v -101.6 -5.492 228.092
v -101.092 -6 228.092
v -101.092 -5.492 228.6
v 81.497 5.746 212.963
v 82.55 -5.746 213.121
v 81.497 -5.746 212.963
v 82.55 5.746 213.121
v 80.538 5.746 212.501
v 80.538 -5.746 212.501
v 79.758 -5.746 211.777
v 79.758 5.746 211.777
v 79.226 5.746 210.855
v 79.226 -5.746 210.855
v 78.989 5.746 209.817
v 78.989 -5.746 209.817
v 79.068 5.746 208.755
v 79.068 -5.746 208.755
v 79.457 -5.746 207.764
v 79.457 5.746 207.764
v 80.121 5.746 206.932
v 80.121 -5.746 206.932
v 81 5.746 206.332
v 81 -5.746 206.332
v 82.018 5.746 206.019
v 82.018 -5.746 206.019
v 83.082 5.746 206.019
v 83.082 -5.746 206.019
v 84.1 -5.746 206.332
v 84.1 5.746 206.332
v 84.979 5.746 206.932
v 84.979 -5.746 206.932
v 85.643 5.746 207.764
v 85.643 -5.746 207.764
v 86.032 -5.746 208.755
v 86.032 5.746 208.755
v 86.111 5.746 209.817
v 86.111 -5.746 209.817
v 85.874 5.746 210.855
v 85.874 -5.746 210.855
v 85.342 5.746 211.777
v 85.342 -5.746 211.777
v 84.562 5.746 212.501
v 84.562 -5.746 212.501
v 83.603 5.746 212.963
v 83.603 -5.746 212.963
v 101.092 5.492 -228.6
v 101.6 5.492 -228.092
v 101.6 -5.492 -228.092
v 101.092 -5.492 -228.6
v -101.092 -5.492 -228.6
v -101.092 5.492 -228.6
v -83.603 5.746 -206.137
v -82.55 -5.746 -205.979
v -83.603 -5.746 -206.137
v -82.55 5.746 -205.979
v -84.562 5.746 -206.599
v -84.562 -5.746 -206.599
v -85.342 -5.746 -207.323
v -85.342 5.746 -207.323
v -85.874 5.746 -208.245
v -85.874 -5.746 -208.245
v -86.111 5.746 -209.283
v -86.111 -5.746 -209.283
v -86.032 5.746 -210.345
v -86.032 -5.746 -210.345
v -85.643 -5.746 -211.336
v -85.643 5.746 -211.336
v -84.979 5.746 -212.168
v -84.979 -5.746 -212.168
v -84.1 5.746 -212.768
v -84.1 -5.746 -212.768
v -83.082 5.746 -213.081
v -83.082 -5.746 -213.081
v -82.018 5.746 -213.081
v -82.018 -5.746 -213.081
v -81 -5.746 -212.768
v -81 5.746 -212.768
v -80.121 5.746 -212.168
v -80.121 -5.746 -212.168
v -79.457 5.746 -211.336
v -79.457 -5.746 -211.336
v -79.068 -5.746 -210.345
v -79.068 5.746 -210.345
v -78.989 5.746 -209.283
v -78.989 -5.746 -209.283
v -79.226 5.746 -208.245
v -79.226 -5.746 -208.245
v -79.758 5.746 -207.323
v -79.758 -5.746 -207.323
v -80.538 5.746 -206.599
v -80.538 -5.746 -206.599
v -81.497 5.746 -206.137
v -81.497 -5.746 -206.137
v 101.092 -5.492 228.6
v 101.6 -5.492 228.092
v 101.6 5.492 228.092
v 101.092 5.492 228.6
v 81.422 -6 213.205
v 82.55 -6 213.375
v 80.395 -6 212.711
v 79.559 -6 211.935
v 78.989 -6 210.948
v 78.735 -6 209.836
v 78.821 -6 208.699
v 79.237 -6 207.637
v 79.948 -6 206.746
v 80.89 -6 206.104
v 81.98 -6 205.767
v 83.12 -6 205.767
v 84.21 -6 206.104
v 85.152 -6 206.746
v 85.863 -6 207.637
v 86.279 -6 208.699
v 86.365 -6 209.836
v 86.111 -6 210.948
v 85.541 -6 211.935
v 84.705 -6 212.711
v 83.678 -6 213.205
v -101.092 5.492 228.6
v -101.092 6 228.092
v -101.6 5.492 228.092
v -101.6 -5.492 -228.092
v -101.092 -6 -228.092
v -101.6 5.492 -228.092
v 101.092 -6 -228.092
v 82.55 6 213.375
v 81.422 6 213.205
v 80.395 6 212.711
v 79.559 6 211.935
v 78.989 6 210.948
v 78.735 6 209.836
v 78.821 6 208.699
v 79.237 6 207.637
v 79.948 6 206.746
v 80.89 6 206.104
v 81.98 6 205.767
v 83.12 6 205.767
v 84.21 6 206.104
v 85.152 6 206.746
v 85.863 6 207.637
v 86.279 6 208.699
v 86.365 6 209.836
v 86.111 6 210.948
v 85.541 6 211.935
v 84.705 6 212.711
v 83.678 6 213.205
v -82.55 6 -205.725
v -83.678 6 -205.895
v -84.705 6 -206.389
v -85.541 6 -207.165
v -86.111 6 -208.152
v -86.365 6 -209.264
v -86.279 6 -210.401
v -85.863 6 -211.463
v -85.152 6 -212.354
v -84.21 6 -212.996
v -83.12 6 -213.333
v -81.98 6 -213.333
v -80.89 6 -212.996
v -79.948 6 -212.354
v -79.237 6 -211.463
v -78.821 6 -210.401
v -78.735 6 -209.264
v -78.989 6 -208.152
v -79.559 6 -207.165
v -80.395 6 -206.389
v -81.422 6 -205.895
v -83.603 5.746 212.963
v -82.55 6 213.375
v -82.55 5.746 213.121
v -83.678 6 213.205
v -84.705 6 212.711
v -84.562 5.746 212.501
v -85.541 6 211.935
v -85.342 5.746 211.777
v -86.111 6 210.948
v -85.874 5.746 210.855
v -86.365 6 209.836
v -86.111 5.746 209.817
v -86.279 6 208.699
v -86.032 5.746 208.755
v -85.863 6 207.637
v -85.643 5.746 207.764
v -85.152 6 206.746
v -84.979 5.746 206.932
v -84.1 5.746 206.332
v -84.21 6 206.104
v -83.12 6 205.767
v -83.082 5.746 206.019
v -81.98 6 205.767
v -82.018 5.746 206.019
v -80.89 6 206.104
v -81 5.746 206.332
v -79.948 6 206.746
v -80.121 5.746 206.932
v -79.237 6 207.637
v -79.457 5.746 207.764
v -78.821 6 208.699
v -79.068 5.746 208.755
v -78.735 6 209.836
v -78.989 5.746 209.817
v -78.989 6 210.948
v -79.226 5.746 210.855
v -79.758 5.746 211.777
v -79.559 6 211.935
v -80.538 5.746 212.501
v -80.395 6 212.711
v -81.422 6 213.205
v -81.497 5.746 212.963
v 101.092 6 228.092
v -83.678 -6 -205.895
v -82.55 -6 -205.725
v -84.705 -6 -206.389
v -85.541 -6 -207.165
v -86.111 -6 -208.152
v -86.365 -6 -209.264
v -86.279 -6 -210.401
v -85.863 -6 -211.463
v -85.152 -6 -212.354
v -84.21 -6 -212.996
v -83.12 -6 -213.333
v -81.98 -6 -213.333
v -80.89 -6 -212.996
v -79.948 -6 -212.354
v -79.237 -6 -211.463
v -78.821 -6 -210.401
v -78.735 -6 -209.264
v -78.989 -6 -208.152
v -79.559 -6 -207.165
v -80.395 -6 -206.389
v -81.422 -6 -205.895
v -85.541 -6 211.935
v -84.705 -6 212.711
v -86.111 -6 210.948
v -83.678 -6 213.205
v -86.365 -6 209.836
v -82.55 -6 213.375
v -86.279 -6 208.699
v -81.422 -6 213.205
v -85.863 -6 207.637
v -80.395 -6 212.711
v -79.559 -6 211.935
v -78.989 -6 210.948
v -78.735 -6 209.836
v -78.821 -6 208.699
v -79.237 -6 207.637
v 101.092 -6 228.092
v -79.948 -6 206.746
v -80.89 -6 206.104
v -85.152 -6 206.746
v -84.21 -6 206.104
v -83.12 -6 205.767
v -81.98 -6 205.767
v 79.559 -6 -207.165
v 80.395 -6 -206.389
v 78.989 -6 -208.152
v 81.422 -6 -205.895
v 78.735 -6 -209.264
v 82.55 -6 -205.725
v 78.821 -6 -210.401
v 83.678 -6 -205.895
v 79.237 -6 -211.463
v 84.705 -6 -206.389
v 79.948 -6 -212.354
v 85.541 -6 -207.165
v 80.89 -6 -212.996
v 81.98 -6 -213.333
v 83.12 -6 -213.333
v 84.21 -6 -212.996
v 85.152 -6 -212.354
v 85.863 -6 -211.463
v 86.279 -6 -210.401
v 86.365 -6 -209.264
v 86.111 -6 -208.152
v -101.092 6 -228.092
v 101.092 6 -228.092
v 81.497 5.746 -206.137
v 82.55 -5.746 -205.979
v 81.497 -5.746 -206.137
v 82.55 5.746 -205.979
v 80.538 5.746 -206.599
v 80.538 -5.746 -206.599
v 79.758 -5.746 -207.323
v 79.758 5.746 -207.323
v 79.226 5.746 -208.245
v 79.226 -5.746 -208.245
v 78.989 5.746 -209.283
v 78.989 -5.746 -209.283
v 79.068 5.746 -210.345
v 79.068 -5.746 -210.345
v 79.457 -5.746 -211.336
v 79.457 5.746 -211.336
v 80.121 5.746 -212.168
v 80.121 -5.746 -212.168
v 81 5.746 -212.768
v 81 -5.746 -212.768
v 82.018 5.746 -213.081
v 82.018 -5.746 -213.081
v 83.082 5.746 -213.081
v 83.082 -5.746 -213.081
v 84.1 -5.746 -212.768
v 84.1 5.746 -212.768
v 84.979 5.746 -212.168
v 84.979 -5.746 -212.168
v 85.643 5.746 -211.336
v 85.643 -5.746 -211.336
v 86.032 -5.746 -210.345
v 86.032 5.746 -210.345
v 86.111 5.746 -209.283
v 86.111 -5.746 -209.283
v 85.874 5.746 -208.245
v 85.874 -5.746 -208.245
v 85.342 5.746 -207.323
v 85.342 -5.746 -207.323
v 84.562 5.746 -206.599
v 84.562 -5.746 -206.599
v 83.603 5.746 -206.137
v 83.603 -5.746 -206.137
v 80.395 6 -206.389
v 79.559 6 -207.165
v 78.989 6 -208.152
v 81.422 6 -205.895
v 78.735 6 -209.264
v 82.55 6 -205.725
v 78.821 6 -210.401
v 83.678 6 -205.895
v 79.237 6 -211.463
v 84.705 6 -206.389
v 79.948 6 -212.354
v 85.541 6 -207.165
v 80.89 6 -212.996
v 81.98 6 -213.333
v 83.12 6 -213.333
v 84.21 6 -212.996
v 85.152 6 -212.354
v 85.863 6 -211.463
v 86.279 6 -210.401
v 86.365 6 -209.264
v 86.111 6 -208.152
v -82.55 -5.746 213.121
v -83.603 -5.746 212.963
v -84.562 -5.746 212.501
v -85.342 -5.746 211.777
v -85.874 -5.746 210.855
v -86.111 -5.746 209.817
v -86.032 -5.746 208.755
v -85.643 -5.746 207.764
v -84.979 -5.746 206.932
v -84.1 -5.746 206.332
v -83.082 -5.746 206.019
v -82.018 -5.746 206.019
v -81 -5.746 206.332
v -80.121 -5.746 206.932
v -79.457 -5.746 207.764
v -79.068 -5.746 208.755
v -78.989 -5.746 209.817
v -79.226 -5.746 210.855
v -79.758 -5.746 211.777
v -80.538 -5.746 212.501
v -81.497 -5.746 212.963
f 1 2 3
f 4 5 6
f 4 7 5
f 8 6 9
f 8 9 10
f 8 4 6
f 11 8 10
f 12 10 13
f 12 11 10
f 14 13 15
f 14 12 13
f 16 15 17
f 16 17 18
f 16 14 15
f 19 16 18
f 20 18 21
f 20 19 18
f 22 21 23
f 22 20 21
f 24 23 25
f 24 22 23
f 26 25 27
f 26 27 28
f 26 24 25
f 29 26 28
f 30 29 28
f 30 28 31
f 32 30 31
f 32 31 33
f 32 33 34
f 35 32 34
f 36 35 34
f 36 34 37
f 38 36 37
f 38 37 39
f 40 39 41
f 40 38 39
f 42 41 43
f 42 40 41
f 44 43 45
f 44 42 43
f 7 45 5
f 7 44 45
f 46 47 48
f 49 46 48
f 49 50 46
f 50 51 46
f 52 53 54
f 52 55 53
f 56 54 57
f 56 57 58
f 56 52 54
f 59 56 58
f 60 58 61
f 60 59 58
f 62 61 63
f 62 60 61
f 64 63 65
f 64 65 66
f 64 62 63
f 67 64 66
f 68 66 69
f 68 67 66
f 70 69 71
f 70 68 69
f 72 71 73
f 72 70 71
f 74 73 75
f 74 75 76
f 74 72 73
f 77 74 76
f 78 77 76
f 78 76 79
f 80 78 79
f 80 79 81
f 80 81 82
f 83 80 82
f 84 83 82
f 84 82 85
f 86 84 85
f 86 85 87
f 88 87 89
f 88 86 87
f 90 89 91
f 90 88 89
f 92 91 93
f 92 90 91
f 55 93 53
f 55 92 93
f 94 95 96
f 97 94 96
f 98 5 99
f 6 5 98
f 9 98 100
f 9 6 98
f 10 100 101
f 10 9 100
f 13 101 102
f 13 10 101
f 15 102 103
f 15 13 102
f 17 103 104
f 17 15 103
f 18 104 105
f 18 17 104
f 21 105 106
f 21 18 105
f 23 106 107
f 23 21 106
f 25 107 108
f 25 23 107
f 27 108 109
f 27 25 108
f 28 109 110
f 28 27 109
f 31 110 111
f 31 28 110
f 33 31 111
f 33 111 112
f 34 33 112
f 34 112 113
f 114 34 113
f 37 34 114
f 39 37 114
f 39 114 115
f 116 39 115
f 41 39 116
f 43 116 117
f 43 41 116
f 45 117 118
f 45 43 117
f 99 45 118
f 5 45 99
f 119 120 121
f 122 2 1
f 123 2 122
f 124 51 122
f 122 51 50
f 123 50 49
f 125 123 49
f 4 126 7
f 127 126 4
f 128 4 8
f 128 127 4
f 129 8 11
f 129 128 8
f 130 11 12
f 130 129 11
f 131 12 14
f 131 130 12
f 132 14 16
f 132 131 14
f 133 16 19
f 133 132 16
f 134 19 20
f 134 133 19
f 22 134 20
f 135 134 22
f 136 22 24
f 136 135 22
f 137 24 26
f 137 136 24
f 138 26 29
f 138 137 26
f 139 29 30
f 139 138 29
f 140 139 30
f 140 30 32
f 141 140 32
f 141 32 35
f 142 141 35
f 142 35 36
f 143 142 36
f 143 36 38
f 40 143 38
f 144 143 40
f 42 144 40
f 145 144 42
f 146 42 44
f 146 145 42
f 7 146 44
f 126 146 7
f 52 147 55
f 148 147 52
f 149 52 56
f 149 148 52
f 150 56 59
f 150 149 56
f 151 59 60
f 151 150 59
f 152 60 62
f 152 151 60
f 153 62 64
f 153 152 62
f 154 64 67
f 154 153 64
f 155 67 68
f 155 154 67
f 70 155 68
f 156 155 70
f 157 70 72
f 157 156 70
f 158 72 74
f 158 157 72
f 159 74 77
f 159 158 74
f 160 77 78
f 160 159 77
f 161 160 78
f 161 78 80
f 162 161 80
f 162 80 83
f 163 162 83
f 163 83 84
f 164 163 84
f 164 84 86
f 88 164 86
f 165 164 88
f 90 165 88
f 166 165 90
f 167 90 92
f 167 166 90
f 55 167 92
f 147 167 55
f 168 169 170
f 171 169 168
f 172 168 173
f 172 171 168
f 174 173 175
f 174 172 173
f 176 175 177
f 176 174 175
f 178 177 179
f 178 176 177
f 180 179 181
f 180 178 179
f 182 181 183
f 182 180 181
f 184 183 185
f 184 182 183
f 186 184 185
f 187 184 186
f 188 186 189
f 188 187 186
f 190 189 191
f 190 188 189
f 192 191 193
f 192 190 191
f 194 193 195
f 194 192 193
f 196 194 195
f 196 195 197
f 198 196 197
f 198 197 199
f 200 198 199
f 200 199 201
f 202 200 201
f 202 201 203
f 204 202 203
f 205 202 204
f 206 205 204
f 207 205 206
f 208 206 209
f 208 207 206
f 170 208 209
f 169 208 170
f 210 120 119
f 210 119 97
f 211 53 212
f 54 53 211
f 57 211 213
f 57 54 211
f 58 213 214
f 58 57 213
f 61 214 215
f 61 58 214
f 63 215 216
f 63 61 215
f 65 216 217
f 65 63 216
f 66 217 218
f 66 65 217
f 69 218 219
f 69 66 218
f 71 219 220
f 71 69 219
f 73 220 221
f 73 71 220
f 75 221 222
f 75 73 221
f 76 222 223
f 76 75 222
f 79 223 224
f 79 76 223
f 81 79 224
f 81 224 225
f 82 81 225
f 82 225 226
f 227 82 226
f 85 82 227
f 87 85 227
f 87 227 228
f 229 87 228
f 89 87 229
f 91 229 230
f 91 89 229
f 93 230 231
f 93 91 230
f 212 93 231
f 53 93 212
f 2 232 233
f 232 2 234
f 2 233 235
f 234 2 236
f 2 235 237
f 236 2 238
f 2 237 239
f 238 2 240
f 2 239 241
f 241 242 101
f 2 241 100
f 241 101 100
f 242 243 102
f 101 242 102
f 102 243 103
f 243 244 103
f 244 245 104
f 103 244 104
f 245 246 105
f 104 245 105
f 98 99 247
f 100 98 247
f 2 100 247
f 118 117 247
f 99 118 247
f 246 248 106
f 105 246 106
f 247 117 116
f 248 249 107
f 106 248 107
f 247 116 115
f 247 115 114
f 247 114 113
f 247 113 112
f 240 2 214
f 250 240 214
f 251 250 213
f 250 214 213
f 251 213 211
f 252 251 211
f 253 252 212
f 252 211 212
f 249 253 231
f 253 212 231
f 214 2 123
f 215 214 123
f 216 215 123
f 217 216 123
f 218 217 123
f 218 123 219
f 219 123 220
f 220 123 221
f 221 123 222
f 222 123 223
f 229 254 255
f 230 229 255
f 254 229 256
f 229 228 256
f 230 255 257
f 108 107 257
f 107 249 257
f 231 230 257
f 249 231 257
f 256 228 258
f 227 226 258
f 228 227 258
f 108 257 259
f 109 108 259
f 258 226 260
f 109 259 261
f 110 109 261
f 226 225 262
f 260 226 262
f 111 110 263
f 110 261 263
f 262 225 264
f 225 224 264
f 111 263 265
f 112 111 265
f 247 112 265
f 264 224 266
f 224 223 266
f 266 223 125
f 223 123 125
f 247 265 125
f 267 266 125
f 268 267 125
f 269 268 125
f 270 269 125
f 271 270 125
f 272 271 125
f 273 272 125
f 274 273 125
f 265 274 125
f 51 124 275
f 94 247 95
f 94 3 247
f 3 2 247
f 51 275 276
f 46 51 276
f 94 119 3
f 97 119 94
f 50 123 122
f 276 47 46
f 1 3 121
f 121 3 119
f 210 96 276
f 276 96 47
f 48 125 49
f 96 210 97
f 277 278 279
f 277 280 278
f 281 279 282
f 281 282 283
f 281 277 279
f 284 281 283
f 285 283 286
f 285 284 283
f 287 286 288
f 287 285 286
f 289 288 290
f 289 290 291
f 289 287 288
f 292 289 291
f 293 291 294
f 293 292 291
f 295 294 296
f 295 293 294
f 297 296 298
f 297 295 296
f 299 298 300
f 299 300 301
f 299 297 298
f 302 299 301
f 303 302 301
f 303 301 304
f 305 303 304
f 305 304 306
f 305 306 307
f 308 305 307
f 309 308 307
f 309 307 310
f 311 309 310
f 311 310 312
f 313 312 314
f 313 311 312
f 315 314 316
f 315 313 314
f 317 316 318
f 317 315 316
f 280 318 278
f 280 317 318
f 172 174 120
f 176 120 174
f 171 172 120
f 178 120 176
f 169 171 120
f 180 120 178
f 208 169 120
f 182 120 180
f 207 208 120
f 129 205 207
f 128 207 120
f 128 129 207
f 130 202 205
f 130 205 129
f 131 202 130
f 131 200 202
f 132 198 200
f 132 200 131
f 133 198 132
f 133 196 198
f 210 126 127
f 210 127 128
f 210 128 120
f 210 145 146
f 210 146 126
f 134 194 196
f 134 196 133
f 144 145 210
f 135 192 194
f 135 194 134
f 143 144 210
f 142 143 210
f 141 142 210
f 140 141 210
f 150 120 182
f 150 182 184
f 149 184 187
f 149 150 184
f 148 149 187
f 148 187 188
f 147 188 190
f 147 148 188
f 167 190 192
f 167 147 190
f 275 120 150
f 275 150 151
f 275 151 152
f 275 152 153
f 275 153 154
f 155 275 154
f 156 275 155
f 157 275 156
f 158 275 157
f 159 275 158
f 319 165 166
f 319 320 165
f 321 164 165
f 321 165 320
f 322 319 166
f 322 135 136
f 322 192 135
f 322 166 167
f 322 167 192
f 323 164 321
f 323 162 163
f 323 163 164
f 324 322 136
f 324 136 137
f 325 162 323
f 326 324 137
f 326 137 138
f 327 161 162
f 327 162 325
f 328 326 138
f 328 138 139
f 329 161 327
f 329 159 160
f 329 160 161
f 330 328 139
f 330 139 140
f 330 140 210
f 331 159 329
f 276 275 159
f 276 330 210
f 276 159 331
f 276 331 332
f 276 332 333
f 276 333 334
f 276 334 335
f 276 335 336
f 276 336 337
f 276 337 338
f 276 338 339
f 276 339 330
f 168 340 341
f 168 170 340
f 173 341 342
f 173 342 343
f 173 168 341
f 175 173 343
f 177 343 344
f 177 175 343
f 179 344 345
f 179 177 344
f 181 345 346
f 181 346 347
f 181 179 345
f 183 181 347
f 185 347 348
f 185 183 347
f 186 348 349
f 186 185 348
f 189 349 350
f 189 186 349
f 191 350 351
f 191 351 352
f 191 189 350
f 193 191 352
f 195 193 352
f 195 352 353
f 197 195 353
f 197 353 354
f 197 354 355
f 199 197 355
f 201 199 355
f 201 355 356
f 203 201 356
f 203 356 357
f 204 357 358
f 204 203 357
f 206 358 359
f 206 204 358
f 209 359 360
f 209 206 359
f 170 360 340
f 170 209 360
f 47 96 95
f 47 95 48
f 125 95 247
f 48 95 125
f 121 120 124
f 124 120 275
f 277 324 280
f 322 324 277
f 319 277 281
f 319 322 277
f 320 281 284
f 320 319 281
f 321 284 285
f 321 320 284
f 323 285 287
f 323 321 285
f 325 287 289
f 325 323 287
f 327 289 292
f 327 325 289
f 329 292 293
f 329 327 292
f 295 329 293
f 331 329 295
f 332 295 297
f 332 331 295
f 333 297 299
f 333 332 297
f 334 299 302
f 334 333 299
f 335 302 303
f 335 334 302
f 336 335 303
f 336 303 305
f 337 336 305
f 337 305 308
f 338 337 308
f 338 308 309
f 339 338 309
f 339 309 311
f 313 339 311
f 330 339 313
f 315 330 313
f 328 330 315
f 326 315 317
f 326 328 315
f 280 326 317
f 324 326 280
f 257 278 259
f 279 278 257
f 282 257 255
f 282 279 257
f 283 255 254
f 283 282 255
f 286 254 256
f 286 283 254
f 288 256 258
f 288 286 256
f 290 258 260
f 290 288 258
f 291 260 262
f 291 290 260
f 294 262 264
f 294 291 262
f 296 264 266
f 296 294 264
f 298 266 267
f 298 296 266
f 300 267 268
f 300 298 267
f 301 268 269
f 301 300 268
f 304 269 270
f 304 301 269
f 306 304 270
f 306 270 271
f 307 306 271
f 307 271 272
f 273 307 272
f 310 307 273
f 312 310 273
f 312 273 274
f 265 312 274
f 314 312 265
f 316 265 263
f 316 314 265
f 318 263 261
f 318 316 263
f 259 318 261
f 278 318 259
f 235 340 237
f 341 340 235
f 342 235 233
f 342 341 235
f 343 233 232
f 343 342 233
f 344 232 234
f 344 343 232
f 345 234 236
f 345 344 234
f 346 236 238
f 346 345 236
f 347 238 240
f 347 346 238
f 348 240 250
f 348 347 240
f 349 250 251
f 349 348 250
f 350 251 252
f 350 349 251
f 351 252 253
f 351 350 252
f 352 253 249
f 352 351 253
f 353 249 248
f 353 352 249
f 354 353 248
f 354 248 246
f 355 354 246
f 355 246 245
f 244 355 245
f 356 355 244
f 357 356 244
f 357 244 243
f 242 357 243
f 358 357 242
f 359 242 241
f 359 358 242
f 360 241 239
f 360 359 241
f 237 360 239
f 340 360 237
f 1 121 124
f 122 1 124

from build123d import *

# Parameters (mm, degrees)
SKETCH1_W                        = 203.2
SKETCH1_H                        = 457.2
BOSS_EXTRUDE1_DEPTH              = 6
F_1_4_CLEARANCE_HOLE1_AT_2_COUNT = 2
F_1_4_CLEARANCE_HOLE1_AT_2_PITCH = 165.1
F_1_4_CLEARANCE_HOLE1_AT_3_COUNT = 2
F_1_4_CLEARANCE_HOLE1_AT_3_PITCH = 450.447355415
F_1_4_CLEARANCE_HOLE1_AT_4_COUNT = 2
F_1_4_CLEARANCE_HOLE1_AT_4_PITCH = 419.1
CHAMFER1_SIZE                    = 0.508


with BuildPart() as part:
    # Sketch1 → Boss-Extrude1 (new, symmetric)
    with BuildSketch(Plane(origin=(0, 0, 0), x_dir=(1, 0, 0), z_dir=(0, 1, 0))):
        Rectangle(SKETCH1_W, SKETCH1_H)
    extrude(amount=BOSS_EXTRUDE1_DEPTH, both=True)

    # Sketch4 → 1/4 Clearance Hole1 (revolve, cut)
    with BuildSketch(Plane(origin=(-82.55, 6, -209.55), x_dir=(0, 0, 1), z_dir=(1, 0, 0))):
        Polygon((0, 0), (0, 12), (3.82524, 12), (3.57124, 11.746), (3.57124, 0.254), (3.82524, 0), align=None)
    f_1_4_clearance_hole1 = revolve(axis=Axis((-82.55, 12.35, -209.55), (0, -1, 0)), mode=Mode.SUBTRACT)

    # 1/4 Clearance Hole1 at 2: 1/4 Clearance Hole1 ×2
    with Locations(*[(i * F_1_4_CLEARANCE_HOLE1_AT_2_PITCH, 0, 0) for i in range(1, F_1_4_CLEARANCE_HOLE1_AT_2_COUNT)]):
        add(f_1_4_clearance_hole1, mode=Mode.SUBTRACT)

    # 1/4 Clearance Hole1 at 3: 1/4 Clearance Hole1 ×2
    with Locations(*[Vector(0.36652451838249067, 0, 0.9304083928170915) * (i * F_1_4_CLEARANCE_HOLE1_AT_3_PITCH) for i in range(1, F_1_4_CLEARANCE_HOLE1_AT_3_COUNT)]):
        add(f_1_4_clearance_hole1, mode=Mode.SUBTRACT)

    # 1/4 Clearance Hole1 at 4: 1/4 Clearance Hole1 ×2
    with Locations(*[(0, 0, i * F_1_4_CLEARANCE_HOLE1_AT_4_PITCH) for i in range(1, F_1_4_CLEARANCE_HOLE1_AT_4_COUNT)]):
        add(f_1_4_clearance_hole1, mode=Mode.SUBTRACT)

    # Chamfer1
    chamfer1_edges = [part.edges().sort_by_distance(p)[0] for p in [
        (101.6, 6, 0),
        (101.6, -6, 0),
        (101.6, 0, -228.6),
        (0, 6, -228.6),
        (0, -6, -228.6),
        (-101.6, 0, -228.6),
        (-101.6, 6, 0),
        (-101.6, -6, 0),
        (-101.6, 0, 228.6),
        (0, 6, 228.6),
        (101.6, 0, 228.6),
        (0, -6, 228.6),
    ]]
    chamfer(chamfer1_edges, length=CHAMFER1_SIZE)


solid = part.part
